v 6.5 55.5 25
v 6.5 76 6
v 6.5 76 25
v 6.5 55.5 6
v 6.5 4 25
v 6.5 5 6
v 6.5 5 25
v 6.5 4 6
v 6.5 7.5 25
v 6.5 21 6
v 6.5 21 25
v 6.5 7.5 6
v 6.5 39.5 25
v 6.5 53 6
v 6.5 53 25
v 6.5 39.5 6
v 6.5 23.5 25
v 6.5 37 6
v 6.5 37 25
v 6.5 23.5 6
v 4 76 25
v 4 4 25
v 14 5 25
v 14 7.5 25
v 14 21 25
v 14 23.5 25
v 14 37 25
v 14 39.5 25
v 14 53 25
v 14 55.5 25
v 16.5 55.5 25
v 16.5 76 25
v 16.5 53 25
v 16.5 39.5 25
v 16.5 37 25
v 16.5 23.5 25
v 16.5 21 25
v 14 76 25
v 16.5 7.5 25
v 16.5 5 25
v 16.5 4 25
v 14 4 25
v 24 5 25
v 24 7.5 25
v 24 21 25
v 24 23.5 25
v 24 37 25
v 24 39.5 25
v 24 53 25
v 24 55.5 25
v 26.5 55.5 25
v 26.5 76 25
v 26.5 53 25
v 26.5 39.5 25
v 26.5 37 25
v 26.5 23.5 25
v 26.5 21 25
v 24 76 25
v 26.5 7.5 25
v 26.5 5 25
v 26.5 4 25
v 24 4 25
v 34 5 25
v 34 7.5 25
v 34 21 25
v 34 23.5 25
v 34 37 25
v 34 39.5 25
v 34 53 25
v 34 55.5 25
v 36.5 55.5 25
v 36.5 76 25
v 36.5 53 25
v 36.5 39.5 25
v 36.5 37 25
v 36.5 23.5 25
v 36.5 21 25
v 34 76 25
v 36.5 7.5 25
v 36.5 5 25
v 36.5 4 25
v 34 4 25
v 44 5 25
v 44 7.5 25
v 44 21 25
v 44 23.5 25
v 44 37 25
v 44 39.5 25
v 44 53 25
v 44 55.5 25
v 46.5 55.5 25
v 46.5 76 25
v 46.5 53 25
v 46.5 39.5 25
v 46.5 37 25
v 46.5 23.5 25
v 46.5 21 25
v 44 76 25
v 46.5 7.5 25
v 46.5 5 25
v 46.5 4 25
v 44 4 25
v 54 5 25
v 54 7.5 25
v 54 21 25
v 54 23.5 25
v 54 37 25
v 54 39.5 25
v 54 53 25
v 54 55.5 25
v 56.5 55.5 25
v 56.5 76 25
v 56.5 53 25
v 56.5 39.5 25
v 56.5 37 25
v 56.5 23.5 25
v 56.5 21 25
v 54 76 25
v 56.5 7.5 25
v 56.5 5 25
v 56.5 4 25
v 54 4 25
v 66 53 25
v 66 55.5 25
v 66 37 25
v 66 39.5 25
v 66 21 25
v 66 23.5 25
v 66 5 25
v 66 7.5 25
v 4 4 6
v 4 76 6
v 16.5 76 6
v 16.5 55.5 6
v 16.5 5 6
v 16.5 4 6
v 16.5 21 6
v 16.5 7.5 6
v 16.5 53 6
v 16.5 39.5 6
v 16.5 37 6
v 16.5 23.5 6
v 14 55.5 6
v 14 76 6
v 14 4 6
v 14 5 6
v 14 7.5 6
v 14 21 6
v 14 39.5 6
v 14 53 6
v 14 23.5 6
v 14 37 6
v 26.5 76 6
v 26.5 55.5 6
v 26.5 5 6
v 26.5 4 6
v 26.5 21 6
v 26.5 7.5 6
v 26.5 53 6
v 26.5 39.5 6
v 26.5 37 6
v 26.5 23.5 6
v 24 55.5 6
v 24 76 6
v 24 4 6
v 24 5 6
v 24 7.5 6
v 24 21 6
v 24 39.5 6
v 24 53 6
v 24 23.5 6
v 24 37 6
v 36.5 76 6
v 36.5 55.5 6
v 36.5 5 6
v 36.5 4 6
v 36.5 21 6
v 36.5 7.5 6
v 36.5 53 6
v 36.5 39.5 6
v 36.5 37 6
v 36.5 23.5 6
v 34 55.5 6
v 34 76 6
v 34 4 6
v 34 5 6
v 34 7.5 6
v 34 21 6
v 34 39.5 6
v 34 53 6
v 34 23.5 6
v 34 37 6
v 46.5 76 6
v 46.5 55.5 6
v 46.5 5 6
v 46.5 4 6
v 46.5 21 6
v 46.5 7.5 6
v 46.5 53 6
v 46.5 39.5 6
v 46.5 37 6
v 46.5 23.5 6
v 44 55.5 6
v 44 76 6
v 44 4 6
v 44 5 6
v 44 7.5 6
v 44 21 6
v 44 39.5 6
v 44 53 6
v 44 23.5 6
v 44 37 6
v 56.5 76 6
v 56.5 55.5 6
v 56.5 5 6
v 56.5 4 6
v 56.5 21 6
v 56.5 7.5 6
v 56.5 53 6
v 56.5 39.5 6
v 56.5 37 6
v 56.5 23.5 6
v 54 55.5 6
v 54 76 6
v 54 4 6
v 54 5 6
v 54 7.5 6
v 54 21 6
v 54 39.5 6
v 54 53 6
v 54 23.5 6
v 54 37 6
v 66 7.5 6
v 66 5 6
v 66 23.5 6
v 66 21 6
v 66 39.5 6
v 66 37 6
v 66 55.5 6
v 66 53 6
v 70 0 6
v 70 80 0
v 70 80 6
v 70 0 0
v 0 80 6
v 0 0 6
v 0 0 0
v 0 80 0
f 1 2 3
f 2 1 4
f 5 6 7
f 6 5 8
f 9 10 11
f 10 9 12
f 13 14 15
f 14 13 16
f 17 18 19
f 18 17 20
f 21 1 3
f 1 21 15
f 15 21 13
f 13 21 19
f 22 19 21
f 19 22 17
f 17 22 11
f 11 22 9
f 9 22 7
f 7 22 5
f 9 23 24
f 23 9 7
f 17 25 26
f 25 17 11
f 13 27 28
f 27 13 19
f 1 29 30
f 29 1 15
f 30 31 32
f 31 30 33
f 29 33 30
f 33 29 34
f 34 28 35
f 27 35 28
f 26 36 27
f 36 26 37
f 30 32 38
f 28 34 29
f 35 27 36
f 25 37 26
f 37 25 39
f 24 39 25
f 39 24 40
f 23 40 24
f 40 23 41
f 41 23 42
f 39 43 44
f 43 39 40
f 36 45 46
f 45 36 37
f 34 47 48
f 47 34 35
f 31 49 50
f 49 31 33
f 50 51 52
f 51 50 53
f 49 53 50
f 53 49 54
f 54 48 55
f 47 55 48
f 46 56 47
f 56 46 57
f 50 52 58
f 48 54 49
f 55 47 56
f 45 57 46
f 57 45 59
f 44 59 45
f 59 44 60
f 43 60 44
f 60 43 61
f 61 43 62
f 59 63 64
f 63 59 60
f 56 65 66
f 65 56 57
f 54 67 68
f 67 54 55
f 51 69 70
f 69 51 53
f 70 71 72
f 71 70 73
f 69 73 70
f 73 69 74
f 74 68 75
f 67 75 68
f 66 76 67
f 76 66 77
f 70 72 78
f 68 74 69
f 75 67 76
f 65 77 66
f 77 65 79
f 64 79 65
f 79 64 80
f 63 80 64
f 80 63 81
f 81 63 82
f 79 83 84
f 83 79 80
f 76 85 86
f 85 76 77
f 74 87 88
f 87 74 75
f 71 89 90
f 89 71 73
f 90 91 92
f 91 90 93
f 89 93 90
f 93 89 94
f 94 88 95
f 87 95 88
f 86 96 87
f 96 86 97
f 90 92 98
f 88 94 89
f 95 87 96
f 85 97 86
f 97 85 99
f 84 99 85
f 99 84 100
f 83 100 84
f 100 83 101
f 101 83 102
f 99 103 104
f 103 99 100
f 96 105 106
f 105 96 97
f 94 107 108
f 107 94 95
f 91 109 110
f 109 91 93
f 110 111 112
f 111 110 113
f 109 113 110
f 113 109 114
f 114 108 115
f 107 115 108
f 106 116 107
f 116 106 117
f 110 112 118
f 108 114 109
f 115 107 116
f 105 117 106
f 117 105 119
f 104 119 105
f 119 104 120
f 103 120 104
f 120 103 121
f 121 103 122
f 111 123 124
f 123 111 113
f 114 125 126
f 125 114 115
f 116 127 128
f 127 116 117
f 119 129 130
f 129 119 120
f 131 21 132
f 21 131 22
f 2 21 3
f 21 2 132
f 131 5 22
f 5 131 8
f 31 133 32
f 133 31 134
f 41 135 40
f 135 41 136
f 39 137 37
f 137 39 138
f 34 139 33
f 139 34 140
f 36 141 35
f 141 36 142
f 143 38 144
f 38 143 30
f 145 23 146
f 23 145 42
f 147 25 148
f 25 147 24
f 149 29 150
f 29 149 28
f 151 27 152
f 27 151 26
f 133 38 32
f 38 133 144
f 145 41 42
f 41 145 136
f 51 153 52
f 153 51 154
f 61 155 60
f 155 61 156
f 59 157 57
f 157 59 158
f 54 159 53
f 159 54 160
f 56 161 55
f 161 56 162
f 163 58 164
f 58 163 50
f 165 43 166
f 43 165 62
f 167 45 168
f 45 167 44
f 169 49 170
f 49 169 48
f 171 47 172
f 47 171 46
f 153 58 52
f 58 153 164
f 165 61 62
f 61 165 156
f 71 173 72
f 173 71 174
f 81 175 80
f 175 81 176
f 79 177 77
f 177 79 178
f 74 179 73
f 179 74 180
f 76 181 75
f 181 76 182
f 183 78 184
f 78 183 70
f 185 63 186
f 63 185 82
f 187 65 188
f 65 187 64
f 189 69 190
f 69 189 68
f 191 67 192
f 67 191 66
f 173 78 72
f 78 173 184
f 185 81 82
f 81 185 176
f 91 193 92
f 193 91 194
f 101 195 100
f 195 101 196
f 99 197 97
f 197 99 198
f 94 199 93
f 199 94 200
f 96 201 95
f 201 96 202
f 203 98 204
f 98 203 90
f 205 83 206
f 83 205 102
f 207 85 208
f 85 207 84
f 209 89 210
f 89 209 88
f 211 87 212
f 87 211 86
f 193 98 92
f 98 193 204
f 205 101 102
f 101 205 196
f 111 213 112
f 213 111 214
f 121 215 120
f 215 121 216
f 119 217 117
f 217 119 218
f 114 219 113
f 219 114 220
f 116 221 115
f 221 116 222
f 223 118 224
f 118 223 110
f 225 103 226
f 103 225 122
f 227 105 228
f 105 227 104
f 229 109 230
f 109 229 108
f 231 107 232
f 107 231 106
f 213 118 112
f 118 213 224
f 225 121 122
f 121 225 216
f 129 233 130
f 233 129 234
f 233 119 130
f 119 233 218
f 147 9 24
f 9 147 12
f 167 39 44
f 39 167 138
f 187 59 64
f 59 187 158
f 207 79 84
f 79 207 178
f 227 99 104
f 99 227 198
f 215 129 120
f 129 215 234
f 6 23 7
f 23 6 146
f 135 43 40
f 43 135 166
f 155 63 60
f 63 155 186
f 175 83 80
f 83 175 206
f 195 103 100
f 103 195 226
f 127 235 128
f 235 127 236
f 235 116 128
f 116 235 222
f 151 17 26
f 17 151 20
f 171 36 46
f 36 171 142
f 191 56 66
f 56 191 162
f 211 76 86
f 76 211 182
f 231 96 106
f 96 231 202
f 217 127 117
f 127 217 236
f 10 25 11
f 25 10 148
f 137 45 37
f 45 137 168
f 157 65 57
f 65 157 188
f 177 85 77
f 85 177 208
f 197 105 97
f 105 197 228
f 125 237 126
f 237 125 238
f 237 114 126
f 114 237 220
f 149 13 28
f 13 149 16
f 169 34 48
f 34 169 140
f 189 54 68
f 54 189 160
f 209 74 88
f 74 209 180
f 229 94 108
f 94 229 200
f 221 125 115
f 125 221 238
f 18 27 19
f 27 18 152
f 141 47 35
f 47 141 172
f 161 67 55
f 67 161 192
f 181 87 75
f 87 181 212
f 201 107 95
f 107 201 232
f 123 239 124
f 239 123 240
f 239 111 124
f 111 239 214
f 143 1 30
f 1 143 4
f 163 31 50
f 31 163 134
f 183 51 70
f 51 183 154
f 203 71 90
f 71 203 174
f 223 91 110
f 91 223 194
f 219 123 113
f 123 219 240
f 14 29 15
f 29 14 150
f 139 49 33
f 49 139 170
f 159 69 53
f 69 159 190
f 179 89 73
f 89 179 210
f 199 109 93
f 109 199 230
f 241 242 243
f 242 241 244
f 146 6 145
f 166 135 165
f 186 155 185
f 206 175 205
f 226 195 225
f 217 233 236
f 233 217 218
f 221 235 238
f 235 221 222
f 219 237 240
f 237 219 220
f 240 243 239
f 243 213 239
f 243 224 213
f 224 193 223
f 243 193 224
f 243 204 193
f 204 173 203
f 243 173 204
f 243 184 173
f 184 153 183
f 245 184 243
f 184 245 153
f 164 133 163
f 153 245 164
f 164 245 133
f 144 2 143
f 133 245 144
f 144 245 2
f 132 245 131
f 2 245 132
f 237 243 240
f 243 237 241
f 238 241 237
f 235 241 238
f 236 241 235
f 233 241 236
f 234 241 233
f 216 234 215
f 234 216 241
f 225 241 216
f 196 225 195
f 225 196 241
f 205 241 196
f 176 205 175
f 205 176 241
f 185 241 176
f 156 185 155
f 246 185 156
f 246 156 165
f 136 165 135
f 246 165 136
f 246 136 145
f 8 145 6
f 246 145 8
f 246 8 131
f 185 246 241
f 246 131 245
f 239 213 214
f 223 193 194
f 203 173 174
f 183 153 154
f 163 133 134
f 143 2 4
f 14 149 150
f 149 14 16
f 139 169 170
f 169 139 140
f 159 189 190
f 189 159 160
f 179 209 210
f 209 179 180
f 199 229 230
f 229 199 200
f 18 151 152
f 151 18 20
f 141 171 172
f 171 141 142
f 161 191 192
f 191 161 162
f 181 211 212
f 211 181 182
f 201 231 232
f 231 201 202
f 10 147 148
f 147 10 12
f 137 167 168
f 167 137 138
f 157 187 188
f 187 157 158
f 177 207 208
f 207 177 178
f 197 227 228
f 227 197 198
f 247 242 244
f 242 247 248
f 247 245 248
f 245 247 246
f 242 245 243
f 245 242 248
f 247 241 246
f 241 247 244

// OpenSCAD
$fn = 32;

// ----------------------------------------------------------------------
// Heatsink: cross fin block
// ----------------------------------------------------------------------

// --- parameters (mm) ---
base_l = 70;              // base length, X
base_w = 80;              // base width, Y
base_t = 6;               // base plate thickness
fin_h = 20;               // fin height above the base
fin_t = 2.5;              // fin thickness
edge = 4;                 // margin from the base ends
pitch = 10;               // fin pitch
rib_pitch = 16;           // cross rib pitch

n_fins = floor((base_l - 2 * edge - fin_t) / pitch) + 1;  // fin count
total_h = base_t + fin_h - 1;  // overall height
n_ribs = floor((base_w - 2 * edge) / rib_pitch);  // rib count

union() {
  cube([base_l, base_w, base_t]);
  for (i = [0 : n_fins - 1])
    translate([edge + i * pitch, edge, base_t - 1])
      cube([fin_t, base_w - 2 * edge, fin_h]);
  for (i = [0 : n_ribs - 1])
    translate([edge, edge + 1 + i * rib_pitch, base_t - 1])
      cube([base_l - 2 * edge, fin_t, fin_h]);
}
